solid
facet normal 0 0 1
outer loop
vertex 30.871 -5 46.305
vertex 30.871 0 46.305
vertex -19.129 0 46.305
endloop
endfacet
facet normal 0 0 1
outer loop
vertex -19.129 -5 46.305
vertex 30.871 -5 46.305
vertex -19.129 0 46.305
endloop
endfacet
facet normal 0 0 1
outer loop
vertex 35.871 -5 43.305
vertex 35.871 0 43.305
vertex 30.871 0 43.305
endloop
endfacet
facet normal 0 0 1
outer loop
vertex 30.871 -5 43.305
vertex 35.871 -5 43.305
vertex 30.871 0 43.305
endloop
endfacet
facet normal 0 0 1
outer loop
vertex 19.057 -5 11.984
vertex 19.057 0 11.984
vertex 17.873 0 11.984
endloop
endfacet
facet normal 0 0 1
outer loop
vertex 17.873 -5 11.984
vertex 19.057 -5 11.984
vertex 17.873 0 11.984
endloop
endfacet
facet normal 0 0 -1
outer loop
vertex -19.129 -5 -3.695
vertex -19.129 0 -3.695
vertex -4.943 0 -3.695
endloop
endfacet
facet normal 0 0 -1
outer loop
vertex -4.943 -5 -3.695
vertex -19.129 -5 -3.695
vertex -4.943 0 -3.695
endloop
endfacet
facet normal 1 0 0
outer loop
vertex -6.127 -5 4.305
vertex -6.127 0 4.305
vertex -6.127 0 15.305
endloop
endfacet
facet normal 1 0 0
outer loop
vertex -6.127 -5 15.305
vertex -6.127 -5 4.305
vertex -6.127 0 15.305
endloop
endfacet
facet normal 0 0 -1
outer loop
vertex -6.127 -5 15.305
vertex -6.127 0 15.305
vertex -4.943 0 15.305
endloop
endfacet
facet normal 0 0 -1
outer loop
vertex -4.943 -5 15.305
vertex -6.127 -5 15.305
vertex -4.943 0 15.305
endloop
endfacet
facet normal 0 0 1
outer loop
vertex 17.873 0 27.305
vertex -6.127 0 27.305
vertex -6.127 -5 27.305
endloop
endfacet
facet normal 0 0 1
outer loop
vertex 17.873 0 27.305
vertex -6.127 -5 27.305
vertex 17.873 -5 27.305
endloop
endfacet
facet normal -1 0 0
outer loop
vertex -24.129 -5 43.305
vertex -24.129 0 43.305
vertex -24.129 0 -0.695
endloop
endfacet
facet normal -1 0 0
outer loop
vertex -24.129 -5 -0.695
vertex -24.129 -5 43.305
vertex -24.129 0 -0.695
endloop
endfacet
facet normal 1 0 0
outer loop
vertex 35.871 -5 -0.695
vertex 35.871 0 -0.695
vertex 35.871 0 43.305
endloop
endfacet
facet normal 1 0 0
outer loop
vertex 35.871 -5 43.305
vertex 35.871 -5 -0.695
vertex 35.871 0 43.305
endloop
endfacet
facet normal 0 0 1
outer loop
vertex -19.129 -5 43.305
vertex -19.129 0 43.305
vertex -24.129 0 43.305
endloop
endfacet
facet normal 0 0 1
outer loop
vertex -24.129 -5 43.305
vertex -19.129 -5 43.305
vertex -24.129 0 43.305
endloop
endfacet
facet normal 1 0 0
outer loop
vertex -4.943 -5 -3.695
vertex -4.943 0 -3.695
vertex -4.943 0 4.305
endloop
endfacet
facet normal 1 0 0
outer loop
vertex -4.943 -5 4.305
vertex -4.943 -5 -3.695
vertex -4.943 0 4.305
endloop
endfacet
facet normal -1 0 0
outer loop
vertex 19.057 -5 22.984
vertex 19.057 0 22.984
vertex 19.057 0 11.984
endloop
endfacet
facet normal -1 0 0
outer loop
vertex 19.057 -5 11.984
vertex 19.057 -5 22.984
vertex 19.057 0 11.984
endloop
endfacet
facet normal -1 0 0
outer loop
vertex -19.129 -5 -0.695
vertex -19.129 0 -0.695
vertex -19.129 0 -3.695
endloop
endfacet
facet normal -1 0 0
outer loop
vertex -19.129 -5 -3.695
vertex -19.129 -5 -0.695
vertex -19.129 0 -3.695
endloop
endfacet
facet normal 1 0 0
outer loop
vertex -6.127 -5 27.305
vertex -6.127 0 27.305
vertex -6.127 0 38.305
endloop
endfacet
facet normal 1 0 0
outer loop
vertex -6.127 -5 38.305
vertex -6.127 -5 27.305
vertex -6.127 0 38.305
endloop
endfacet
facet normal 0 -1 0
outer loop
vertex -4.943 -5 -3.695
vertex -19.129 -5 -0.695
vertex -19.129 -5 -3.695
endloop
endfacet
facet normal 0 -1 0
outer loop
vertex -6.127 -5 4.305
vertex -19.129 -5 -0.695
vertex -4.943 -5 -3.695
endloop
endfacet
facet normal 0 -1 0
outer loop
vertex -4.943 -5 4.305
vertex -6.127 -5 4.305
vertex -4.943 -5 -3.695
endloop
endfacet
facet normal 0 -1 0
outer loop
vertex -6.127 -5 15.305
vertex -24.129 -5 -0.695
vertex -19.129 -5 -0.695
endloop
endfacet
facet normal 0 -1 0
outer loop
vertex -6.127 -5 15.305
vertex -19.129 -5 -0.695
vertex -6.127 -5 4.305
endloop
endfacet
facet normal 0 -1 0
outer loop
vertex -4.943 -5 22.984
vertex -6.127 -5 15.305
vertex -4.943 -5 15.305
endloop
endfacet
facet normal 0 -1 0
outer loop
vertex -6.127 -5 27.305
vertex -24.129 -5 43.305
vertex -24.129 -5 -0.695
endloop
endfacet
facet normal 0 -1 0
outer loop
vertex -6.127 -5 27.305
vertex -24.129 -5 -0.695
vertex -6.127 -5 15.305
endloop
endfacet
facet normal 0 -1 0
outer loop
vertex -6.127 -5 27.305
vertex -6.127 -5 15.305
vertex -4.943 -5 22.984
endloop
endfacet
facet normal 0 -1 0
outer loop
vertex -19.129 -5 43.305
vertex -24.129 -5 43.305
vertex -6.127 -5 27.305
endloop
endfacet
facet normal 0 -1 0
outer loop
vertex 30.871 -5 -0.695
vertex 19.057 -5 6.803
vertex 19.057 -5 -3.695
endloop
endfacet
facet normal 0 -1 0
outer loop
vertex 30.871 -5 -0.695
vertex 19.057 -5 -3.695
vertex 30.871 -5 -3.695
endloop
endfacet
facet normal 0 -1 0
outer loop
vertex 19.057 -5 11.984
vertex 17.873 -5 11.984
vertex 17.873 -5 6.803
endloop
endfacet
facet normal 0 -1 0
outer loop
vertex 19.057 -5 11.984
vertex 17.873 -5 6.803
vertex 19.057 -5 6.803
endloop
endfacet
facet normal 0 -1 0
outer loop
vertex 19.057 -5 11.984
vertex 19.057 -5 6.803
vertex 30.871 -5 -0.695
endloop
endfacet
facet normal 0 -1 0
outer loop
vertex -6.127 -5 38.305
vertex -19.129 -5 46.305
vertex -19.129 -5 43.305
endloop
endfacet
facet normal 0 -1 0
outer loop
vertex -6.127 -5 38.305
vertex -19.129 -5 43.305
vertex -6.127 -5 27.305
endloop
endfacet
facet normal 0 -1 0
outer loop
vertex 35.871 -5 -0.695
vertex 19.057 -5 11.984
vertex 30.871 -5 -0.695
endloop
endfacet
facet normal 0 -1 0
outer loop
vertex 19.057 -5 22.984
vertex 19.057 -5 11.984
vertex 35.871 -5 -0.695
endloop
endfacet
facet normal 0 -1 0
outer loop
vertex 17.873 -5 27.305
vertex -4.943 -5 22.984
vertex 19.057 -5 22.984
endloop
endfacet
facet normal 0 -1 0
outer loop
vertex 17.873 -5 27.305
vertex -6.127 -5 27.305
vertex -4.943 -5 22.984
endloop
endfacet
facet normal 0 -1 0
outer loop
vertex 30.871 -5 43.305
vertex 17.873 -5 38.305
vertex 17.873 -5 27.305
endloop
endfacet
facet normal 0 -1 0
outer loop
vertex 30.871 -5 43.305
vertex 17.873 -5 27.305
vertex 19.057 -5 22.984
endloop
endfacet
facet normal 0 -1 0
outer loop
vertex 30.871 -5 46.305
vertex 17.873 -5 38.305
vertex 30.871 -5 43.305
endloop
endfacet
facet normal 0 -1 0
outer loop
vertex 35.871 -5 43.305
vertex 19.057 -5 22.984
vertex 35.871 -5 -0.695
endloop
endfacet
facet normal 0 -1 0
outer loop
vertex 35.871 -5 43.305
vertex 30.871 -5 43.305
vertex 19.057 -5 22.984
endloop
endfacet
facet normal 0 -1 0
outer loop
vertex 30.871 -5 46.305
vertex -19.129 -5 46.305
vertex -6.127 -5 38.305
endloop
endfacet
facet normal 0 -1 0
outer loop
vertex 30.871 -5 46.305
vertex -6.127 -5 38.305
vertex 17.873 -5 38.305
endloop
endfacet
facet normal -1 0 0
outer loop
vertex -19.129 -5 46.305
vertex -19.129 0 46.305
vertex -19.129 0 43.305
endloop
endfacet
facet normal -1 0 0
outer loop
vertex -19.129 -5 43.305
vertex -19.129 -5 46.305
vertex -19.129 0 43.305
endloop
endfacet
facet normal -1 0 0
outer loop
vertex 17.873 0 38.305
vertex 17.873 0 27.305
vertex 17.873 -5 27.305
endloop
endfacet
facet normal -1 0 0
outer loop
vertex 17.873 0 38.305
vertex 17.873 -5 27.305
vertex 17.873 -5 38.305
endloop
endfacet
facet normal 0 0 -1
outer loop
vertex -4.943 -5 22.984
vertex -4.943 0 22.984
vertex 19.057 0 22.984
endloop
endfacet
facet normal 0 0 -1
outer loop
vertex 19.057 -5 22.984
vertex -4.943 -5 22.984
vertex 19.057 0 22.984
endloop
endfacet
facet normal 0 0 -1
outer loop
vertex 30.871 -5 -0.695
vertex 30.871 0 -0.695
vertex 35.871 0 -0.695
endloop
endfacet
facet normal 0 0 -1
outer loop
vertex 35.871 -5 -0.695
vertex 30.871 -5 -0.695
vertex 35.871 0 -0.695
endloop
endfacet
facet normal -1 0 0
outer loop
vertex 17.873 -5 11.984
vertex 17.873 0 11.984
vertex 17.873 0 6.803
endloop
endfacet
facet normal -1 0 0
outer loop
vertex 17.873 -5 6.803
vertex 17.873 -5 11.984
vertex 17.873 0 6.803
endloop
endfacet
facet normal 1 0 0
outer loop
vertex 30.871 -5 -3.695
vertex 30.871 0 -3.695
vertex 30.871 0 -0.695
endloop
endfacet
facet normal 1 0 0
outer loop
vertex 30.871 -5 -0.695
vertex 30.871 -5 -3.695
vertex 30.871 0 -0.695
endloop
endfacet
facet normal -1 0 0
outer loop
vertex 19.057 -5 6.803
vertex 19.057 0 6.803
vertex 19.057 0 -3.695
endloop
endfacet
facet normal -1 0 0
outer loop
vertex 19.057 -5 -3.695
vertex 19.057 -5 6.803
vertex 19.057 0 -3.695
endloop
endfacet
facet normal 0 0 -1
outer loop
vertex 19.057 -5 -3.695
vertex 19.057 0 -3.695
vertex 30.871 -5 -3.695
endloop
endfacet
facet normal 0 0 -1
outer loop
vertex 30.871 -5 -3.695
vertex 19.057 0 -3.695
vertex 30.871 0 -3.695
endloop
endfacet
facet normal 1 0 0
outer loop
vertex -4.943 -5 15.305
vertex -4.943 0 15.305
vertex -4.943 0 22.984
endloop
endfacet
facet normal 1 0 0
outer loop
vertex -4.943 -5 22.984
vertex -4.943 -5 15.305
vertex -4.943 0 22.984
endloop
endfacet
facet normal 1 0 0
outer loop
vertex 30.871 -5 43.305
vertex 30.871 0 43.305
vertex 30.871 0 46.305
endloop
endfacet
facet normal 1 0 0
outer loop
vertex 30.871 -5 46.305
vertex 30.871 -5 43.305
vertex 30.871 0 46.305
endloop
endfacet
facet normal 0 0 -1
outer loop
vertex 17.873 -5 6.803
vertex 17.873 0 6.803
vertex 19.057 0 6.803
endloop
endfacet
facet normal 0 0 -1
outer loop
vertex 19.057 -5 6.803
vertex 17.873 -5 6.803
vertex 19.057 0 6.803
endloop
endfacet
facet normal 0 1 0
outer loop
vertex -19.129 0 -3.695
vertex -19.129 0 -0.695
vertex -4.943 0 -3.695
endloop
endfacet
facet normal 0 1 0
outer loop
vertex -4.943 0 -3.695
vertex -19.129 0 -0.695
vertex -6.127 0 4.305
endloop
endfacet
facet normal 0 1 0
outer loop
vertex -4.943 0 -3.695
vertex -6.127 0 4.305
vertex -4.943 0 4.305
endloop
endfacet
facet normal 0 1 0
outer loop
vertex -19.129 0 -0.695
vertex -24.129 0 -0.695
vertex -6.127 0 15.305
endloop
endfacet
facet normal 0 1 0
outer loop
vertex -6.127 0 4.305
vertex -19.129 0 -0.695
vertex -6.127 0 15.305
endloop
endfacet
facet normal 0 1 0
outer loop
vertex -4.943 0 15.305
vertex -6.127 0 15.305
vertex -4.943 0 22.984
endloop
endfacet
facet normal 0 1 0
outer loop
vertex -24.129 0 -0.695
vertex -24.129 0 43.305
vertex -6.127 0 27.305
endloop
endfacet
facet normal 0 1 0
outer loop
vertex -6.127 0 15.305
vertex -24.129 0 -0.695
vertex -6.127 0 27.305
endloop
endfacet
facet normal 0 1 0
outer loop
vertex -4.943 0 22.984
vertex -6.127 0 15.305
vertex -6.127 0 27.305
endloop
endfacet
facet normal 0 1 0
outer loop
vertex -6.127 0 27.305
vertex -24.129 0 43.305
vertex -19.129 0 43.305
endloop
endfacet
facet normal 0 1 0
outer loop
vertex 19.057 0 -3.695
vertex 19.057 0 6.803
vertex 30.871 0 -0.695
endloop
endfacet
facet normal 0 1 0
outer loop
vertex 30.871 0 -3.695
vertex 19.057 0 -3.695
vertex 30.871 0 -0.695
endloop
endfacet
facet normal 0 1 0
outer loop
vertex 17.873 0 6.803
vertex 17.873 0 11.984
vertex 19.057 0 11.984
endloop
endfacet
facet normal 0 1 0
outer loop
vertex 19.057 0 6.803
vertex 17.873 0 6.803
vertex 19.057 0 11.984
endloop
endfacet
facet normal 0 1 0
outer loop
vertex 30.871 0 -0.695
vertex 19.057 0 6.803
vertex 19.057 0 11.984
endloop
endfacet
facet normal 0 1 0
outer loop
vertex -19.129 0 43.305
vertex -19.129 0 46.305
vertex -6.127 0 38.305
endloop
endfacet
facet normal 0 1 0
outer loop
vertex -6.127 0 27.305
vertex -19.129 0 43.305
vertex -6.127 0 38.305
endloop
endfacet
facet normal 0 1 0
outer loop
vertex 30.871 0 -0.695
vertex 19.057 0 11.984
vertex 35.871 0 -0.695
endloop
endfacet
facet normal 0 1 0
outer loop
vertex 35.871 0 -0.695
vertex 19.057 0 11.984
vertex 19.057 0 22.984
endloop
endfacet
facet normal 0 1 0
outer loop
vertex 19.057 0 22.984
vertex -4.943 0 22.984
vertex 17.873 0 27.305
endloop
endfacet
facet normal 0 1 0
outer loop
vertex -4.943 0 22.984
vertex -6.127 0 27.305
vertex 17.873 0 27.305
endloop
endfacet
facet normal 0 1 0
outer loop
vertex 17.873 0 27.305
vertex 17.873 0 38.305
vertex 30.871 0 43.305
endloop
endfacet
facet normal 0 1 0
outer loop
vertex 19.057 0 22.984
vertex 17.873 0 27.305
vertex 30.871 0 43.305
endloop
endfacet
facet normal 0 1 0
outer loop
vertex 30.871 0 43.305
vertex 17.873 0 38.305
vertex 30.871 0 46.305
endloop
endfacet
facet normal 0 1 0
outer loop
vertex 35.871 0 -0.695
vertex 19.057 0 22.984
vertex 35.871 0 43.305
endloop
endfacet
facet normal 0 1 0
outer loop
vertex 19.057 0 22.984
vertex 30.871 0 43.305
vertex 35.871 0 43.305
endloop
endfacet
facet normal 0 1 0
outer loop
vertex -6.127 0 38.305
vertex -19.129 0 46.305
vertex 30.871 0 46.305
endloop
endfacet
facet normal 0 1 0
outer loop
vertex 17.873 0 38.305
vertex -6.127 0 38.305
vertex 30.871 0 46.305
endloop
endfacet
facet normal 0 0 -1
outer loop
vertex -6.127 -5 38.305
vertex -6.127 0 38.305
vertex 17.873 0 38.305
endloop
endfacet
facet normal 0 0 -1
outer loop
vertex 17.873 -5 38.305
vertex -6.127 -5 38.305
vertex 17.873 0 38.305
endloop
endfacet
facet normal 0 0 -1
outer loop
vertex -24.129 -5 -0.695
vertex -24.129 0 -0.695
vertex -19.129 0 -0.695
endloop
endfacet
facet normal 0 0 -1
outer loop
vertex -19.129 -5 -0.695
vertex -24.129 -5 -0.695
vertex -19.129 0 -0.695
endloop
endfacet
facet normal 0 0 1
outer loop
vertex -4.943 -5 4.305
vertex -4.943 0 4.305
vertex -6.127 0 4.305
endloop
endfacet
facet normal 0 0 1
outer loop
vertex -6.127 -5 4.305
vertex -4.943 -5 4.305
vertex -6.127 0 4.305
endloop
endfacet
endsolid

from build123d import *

# Parameters (mm, degrees)
F1_W     = 24
F1_H     = 11
F2_DEPTH = 5


with BuildPart() as f2:
    # F1 (on face) → F2 (new body)
    with BuildSketch(Plane.XZ):
        Polygon((-4.942675, 15.304768), (-4.942675, 22.984039), (19.057325, 22.984039), (19.057325, 11.984039), (17.873291, 11.984039), (17.873291, 6.802615), (19.057325, 6.802615), (19.057325, -3.695232), (30.870639, -3.695232), (30.870639, -0.695232), (35.870639, -0.695232), (35.870639, 43.304768), (30.870639, 43.304768), (30.870639, 46.304768), (-19.129361, 46.304768), (-19.129361, 43.304768), (-24.129361, 43.304768), (-24.129361, -0.695232), (-19.129361, -0.695232), (-19.129361, -3.695232), (-4.942675, -3.695232), (-4.942675, 4.304768), (-6.126709, 4.304768), (-6.126709, 15.304768), align=None)
        with Locations((5.873291, 32.804768)):
            Rectangle(F1_W, F1_H, mode=Mode.SUBTRACT)
    extrude(amount=F2_DEPTH)


solid = f2.part
